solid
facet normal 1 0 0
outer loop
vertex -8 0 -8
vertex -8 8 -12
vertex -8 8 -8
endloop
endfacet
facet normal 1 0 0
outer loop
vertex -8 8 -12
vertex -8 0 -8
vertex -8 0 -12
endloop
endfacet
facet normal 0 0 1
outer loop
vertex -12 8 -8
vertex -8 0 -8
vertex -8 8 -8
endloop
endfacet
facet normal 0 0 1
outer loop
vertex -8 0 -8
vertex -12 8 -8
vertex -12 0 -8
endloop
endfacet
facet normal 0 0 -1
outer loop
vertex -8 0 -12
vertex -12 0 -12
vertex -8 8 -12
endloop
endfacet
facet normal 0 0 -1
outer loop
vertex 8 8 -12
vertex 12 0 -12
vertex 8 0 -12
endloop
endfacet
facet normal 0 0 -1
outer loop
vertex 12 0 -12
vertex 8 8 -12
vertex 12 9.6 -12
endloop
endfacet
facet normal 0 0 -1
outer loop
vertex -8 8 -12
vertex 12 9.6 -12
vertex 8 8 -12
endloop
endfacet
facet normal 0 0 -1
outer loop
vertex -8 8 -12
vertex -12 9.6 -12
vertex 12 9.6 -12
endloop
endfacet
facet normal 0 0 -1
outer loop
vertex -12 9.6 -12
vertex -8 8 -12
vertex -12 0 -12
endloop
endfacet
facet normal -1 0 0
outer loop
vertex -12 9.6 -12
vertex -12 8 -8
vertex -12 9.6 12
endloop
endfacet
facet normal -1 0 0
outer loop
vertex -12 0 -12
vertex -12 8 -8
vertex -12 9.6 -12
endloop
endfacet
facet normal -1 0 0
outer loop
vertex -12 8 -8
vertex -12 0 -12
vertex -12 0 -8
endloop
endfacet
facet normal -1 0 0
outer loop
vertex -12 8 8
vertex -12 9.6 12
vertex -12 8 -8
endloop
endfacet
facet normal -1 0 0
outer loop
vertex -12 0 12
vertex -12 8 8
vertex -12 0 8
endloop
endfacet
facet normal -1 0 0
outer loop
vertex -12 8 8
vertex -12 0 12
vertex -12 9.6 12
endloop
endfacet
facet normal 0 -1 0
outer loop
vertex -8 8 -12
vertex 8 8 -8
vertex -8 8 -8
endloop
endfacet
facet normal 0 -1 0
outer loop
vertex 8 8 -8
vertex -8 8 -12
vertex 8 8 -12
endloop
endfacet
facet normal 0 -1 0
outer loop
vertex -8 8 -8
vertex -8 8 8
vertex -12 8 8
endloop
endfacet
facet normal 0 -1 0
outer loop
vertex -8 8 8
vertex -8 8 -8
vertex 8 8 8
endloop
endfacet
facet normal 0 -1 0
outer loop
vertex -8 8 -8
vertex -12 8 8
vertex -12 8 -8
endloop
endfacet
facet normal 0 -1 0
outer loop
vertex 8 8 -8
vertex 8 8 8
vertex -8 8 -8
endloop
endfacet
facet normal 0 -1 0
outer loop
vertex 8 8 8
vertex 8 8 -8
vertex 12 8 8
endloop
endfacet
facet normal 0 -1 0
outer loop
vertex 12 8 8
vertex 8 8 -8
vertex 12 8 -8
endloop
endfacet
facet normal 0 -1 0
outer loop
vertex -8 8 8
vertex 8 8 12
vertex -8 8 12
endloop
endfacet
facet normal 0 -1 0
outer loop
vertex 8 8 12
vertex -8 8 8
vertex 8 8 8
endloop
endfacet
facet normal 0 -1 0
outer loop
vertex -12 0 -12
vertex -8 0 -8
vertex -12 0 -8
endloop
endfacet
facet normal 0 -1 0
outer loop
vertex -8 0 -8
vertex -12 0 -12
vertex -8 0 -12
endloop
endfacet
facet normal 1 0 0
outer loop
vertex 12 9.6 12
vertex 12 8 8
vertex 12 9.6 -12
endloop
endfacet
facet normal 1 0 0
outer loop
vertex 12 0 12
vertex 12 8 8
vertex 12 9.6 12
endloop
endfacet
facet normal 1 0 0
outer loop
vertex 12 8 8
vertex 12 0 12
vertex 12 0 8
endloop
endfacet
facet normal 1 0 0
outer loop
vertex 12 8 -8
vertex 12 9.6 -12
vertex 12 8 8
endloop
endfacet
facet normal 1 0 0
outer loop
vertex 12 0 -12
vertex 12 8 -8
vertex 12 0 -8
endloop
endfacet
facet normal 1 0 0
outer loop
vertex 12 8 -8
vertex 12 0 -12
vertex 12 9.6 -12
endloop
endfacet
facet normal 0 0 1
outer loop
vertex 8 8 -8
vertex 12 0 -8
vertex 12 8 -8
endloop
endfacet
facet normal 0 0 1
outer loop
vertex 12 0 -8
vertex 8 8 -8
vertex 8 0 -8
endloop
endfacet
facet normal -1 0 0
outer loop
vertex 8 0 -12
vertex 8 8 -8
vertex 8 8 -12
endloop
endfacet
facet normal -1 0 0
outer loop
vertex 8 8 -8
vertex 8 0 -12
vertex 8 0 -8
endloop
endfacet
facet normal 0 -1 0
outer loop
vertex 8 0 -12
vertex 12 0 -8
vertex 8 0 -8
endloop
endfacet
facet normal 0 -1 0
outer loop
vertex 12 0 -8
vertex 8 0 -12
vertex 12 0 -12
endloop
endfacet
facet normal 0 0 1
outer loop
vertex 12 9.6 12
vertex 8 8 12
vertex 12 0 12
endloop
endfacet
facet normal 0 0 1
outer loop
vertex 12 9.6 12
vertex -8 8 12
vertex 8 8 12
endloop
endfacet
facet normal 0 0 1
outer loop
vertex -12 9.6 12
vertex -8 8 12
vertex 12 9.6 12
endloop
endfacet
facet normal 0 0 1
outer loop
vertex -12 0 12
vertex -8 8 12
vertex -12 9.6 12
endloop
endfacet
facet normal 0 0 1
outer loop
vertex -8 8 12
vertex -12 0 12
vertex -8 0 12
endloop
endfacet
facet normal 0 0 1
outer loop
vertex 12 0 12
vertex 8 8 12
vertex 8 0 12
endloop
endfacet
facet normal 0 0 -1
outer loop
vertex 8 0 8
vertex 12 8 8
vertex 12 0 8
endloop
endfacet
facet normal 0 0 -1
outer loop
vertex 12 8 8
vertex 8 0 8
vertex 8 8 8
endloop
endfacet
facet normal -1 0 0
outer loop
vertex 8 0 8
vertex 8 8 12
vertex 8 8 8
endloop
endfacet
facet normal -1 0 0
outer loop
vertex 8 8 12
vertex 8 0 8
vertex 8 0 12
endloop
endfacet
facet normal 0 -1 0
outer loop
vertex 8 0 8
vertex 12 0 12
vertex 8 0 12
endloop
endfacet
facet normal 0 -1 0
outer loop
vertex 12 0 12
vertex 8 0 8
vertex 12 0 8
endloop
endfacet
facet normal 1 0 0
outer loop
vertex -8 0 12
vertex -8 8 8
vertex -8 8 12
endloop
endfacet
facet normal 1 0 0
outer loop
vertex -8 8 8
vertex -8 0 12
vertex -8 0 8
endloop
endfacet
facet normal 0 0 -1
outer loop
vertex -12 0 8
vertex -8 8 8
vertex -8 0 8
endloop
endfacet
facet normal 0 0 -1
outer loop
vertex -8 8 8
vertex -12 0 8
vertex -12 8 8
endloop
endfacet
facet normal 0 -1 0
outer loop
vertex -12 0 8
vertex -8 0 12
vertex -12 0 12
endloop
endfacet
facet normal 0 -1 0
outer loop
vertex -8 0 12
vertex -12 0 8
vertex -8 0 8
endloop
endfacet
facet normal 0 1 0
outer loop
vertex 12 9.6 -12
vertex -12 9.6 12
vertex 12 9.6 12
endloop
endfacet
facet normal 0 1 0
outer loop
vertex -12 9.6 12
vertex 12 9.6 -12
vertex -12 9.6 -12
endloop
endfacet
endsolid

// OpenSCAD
translate([-12,0,-12])//we can use negative values only in translate function not in other like cube or sphere.

cube([4,8,4]);
translate([8,0,-12])
cube([4,8,4]);
translate([8,0,8])
cube([4,8,4]);
translate([-12,0,8])
cube([4,8,4]);
translate([-12,8,-12])
scale([3,0.2,3])
cube(8,0,12);
//This is very basic structure of table looking foward for more, This is also called takhat-pose in the villages. :D 
